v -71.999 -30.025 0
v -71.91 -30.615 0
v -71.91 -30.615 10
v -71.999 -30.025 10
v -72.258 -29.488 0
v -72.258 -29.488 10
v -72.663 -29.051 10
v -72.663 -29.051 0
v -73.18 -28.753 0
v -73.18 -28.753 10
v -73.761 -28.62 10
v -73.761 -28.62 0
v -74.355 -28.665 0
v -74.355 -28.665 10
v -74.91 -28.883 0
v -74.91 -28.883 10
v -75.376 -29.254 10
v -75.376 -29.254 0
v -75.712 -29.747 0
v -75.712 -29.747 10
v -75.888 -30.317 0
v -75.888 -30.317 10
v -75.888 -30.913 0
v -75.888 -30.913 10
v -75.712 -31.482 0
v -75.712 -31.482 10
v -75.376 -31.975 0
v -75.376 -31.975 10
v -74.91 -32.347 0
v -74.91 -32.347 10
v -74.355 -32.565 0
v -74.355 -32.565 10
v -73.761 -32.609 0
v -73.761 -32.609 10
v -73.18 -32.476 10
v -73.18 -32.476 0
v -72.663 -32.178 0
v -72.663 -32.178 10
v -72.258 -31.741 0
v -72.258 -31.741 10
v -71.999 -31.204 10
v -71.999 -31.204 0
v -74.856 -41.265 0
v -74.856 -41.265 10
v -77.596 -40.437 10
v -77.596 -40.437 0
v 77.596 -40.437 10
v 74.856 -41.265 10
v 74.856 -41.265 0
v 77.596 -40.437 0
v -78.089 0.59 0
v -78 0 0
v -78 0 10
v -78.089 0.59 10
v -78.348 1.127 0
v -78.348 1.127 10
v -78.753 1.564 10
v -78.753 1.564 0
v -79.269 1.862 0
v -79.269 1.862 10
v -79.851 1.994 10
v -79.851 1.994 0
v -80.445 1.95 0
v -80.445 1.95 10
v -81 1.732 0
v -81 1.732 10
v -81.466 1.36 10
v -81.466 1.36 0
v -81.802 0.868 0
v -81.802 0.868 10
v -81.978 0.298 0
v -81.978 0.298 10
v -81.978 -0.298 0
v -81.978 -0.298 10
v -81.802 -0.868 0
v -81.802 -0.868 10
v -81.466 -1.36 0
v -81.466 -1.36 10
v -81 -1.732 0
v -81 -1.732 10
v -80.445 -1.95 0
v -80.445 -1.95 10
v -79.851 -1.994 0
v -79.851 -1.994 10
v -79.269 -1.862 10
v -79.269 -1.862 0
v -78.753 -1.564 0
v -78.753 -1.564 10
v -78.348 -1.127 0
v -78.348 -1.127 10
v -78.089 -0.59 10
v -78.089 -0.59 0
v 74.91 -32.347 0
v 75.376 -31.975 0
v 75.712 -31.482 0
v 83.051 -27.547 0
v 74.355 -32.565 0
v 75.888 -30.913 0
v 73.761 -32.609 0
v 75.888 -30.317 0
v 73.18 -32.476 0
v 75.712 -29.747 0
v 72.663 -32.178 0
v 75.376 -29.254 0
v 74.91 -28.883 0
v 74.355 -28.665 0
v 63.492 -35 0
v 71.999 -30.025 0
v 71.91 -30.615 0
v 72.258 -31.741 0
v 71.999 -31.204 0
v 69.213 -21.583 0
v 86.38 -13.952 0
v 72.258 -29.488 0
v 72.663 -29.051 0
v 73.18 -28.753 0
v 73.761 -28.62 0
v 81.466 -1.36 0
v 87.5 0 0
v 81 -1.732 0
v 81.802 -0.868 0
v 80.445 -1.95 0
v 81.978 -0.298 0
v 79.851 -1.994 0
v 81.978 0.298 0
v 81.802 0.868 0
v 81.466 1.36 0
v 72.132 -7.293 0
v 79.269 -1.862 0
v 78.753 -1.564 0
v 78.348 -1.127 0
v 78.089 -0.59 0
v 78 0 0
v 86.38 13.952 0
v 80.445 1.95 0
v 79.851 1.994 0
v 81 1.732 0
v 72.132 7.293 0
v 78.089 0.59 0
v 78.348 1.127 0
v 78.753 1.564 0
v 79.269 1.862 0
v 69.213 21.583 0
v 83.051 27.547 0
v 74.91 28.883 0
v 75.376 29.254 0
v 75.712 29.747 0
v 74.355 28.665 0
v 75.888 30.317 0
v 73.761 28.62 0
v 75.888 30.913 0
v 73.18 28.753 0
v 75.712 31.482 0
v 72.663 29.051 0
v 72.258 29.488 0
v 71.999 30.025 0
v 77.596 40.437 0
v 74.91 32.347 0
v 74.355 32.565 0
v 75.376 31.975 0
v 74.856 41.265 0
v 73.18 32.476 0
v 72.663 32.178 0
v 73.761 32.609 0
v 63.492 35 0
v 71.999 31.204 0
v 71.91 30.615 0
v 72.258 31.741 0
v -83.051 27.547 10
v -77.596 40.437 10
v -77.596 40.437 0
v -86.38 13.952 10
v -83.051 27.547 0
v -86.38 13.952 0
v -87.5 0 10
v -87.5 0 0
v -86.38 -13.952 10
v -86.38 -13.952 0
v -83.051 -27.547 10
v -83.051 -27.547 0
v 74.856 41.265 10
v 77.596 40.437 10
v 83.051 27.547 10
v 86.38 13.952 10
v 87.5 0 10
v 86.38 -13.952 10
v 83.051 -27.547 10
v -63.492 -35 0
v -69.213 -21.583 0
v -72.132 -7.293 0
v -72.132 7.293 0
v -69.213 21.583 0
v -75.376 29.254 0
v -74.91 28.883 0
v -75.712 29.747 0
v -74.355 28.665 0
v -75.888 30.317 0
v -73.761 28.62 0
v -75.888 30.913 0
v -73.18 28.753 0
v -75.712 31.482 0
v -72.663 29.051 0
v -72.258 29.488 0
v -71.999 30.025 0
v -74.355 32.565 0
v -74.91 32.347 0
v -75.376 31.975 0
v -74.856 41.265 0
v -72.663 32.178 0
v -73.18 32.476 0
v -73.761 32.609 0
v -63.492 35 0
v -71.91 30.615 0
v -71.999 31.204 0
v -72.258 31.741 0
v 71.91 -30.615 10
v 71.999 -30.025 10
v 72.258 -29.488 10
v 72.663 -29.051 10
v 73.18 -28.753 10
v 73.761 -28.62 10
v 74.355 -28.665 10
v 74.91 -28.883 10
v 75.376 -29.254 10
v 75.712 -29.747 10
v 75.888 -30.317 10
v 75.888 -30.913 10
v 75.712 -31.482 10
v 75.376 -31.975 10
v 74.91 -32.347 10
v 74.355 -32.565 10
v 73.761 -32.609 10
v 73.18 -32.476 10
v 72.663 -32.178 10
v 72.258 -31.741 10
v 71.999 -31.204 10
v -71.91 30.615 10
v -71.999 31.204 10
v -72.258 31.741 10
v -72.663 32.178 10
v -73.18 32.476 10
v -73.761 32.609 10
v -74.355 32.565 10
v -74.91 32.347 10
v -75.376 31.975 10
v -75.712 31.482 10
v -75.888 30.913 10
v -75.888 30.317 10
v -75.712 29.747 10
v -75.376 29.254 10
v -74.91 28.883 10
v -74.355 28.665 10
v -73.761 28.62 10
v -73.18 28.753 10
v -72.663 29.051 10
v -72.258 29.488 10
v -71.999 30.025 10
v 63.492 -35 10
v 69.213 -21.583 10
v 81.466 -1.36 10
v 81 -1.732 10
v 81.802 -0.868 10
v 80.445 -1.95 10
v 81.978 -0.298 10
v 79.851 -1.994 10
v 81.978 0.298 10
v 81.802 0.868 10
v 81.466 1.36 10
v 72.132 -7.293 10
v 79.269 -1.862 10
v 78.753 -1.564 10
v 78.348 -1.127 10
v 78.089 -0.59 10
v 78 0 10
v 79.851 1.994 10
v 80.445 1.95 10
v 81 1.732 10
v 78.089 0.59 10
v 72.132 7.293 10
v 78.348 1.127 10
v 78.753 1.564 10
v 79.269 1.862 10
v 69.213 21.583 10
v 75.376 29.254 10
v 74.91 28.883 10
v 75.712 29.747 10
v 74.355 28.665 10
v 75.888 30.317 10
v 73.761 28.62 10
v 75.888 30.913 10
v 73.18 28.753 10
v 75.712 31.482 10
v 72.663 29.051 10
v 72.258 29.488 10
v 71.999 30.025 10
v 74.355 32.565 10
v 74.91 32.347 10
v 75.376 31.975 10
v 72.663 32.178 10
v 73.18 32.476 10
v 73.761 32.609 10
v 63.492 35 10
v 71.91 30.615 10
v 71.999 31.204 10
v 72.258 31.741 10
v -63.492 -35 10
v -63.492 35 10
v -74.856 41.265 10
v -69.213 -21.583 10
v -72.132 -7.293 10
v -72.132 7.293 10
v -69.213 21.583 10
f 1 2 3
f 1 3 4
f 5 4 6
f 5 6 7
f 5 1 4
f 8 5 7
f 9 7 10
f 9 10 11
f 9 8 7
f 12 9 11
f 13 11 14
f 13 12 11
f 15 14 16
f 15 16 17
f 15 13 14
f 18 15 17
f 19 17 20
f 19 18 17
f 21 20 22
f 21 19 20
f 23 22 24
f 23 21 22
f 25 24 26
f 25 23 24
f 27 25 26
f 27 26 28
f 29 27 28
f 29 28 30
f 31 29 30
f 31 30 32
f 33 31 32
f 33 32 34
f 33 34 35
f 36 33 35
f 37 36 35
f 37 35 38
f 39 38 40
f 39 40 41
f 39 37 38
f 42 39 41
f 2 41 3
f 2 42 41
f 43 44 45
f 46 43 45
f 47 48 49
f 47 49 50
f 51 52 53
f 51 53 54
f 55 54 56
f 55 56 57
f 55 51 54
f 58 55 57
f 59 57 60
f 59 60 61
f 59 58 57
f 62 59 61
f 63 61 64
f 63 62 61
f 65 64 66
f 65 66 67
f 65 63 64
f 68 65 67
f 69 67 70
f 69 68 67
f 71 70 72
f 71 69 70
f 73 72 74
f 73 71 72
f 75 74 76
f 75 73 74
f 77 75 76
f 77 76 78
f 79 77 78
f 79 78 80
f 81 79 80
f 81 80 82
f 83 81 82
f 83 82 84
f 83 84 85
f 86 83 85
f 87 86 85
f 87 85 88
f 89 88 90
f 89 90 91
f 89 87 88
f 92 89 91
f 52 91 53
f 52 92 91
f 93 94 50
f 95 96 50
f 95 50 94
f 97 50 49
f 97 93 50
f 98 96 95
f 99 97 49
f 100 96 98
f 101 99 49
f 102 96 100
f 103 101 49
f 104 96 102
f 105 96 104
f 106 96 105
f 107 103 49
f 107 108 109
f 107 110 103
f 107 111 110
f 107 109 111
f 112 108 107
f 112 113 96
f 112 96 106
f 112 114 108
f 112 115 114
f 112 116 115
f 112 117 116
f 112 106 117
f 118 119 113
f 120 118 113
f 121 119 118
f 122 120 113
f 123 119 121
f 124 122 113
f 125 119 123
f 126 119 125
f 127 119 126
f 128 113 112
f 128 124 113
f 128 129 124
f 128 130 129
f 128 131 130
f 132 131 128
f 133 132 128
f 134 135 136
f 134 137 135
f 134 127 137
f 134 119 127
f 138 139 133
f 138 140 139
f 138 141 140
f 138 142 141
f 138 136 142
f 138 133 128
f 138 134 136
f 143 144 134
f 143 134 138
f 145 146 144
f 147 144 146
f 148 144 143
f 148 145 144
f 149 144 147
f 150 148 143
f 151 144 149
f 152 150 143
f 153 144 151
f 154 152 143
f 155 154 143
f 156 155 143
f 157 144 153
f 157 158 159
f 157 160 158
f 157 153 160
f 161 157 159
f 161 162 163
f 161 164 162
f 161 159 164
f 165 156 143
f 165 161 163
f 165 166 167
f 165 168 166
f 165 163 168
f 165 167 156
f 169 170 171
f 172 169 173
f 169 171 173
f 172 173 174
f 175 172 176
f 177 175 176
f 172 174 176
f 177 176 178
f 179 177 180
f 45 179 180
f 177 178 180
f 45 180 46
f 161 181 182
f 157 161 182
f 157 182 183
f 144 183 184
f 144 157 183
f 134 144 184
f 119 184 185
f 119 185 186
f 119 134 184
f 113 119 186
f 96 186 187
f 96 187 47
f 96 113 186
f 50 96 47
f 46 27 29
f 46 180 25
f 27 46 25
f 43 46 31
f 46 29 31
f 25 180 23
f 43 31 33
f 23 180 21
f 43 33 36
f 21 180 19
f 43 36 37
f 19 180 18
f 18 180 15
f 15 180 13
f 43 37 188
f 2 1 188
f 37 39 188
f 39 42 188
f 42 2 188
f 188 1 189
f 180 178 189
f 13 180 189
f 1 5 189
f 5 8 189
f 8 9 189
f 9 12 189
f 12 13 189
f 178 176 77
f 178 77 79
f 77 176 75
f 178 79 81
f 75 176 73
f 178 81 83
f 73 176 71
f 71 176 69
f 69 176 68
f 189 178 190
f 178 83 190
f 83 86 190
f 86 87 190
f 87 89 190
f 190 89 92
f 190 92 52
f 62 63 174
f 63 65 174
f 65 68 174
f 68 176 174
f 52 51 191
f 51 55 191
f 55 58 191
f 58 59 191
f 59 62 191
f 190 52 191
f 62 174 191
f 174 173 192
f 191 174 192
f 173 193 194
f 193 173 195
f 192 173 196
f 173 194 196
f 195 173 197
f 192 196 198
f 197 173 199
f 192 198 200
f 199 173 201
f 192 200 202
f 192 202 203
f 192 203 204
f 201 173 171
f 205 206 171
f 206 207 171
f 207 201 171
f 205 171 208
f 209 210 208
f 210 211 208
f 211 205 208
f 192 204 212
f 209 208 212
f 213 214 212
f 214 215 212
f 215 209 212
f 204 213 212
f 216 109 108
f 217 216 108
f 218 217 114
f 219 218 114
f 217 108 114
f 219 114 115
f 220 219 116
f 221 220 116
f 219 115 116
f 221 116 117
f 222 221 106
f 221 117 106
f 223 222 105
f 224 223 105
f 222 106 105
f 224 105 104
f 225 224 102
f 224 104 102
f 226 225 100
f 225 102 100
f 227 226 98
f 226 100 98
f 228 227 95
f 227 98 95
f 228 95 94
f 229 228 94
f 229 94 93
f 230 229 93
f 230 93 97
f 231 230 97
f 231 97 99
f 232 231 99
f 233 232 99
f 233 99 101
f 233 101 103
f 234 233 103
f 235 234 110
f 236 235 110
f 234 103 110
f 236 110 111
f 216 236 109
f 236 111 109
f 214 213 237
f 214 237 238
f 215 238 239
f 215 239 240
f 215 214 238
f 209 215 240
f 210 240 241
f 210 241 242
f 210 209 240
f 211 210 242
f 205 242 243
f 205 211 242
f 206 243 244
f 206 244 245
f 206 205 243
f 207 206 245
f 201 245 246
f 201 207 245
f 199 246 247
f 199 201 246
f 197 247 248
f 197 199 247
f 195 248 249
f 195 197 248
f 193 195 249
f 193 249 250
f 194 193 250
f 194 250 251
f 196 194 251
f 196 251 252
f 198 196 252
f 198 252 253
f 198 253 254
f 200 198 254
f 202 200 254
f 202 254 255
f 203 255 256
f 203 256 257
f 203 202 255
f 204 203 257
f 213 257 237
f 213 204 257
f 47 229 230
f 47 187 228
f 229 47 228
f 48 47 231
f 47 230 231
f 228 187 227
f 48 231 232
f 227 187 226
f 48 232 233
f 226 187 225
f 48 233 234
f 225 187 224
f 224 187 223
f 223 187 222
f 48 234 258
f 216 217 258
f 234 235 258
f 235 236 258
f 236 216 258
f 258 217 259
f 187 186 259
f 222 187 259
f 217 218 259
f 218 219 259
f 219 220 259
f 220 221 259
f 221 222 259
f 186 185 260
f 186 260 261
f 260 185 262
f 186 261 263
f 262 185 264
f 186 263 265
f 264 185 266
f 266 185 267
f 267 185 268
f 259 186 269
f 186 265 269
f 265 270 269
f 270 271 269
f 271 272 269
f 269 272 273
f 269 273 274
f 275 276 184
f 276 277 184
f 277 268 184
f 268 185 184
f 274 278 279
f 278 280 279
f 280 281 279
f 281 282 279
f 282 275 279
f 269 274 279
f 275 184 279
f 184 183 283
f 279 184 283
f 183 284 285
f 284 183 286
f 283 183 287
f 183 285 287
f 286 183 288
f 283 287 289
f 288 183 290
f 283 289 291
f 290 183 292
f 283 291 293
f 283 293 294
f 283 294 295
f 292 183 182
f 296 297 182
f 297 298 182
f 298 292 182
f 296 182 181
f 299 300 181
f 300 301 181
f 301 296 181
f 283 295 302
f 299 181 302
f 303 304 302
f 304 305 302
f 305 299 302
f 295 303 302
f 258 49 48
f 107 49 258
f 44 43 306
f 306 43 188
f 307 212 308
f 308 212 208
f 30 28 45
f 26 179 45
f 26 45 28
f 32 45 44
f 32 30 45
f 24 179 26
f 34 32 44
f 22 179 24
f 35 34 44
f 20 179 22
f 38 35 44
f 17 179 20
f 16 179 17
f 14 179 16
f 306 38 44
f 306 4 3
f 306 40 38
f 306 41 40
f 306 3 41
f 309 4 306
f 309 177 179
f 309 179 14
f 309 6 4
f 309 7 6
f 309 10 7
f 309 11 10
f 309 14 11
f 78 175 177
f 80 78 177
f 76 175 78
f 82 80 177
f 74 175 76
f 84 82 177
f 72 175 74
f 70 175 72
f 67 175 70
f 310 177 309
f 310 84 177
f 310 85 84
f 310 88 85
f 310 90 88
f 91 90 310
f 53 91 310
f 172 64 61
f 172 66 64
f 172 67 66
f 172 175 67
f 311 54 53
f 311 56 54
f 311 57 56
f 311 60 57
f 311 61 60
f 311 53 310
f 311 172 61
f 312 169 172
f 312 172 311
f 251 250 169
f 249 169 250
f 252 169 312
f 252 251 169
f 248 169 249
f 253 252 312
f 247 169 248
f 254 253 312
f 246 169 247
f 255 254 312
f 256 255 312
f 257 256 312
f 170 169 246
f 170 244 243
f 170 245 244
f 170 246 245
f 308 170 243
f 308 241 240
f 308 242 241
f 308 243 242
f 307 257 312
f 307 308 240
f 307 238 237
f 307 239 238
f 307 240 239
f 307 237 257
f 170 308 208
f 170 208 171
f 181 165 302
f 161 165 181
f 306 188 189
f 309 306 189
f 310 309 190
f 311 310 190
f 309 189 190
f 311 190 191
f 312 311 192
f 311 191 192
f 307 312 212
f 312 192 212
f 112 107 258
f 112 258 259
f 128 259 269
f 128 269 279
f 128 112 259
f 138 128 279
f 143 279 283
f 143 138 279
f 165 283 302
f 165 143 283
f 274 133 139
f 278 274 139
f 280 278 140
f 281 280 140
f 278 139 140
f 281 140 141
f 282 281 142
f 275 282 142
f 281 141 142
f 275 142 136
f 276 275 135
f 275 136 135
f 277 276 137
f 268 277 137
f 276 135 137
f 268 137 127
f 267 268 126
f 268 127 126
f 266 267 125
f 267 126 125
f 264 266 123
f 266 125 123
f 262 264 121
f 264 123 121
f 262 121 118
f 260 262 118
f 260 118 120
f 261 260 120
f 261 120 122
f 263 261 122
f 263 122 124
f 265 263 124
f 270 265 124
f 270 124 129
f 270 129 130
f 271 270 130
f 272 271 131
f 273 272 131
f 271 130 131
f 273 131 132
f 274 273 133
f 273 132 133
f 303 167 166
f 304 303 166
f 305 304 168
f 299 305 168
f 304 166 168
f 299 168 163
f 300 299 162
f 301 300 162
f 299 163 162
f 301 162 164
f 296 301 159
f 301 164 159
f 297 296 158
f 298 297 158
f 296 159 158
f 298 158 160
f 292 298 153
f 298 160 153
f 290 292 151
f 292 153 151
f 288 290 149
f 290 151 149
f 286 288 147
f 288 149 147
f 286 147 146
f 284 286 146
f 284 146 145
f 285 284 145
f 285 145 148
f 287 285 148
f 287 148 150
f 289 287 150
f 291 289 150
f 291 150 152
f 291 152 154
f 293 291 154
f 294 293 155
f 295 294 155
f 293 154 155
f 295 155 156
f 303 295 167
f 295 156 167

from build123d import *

# Parameters (mm, degrees)
F0_R        = 2
F1_DEPTH    = 10
F2_T1_DEPTH = 20.5212634911


# Not quite as in the source:
# - a fillet or chamfer that OpenCascade refuses, or shapes differently, is made with other operations: its cross-section is extruded or revolved along the edge and cut away or added


with BuildPart() as f1:
    # F0 (on Top) → F1 (new body)
    with BuildSketch(Plane.XY):
        with BuildLine():
            ThreePointArc((-63.492125496, -35), (-72.5, 0), (-63.492125496, 35))
            Line((-63.492125496, 35), (-76.6284273228, 42.2413793103))
            ThreePointArc((-76.6284273228, 42.2413793103), (-87.5, 0), (-76.6284273228, -42.2413793103))
            Line((-76.6284273228, -42.2413793103), (-63.492125496, -35))
        make_face()
        with Locations((-73.9103626009, -30.6146745892)):
            Circle(F0_R, mode=Mode.SUBTRACT)
        with Locations((-80, 0)):
            Circle(F0_R, mode=Mode.SUBTRACT)
        with Locations((-73.9103626009, 30.6146745892)):
            Circle(F0_R, mode=Mode.SUBTRACT)
    extrude(amount=F1_DEPTH)

    # F2: chamfer of 2 on 2 edges, made by hand

    # F2_s2 → F2_t1 (cut)
    with BuildSketch(Plane.XY.offset(-5.2606317456)):
        with BuildLine():
            Line((-74.8564321485, 41.2645679245), (-77.5955622411, 40.4373431432))
            ThreePointArc((-77.5955622411, 40.4373431432), (-77.1306266641, 41.3172655242), (-76.6284273228, 42.2413793103))
            Line((-76.6284273228, 42.2413793103), (-74.8564321485, 41.2645679245))
        make_face()
        with BuildLine():
            Line((-74.8564321485, -41.2645679245), (-77.5955622411, -40.4373431432))
            ThreePointArc((-77.5955622411, -40.4373431432), (-77.1306266641, -41.3172655242), (-76.6284273228, -42.2413793103))
            Line((-76.6284273228, -42.2413793103), (-74.8564321485, -41.2645679245))
        make_face()
    extrude(amount=F2_T1_DEPTH, mode=Mode.SUBTRACT)


with BuildPart() as f3_1:
    # F3: instance of F1
    add(f1.part.mirror(Plane.YZ))


solid = Compound([f1.part, f3_1.part])
